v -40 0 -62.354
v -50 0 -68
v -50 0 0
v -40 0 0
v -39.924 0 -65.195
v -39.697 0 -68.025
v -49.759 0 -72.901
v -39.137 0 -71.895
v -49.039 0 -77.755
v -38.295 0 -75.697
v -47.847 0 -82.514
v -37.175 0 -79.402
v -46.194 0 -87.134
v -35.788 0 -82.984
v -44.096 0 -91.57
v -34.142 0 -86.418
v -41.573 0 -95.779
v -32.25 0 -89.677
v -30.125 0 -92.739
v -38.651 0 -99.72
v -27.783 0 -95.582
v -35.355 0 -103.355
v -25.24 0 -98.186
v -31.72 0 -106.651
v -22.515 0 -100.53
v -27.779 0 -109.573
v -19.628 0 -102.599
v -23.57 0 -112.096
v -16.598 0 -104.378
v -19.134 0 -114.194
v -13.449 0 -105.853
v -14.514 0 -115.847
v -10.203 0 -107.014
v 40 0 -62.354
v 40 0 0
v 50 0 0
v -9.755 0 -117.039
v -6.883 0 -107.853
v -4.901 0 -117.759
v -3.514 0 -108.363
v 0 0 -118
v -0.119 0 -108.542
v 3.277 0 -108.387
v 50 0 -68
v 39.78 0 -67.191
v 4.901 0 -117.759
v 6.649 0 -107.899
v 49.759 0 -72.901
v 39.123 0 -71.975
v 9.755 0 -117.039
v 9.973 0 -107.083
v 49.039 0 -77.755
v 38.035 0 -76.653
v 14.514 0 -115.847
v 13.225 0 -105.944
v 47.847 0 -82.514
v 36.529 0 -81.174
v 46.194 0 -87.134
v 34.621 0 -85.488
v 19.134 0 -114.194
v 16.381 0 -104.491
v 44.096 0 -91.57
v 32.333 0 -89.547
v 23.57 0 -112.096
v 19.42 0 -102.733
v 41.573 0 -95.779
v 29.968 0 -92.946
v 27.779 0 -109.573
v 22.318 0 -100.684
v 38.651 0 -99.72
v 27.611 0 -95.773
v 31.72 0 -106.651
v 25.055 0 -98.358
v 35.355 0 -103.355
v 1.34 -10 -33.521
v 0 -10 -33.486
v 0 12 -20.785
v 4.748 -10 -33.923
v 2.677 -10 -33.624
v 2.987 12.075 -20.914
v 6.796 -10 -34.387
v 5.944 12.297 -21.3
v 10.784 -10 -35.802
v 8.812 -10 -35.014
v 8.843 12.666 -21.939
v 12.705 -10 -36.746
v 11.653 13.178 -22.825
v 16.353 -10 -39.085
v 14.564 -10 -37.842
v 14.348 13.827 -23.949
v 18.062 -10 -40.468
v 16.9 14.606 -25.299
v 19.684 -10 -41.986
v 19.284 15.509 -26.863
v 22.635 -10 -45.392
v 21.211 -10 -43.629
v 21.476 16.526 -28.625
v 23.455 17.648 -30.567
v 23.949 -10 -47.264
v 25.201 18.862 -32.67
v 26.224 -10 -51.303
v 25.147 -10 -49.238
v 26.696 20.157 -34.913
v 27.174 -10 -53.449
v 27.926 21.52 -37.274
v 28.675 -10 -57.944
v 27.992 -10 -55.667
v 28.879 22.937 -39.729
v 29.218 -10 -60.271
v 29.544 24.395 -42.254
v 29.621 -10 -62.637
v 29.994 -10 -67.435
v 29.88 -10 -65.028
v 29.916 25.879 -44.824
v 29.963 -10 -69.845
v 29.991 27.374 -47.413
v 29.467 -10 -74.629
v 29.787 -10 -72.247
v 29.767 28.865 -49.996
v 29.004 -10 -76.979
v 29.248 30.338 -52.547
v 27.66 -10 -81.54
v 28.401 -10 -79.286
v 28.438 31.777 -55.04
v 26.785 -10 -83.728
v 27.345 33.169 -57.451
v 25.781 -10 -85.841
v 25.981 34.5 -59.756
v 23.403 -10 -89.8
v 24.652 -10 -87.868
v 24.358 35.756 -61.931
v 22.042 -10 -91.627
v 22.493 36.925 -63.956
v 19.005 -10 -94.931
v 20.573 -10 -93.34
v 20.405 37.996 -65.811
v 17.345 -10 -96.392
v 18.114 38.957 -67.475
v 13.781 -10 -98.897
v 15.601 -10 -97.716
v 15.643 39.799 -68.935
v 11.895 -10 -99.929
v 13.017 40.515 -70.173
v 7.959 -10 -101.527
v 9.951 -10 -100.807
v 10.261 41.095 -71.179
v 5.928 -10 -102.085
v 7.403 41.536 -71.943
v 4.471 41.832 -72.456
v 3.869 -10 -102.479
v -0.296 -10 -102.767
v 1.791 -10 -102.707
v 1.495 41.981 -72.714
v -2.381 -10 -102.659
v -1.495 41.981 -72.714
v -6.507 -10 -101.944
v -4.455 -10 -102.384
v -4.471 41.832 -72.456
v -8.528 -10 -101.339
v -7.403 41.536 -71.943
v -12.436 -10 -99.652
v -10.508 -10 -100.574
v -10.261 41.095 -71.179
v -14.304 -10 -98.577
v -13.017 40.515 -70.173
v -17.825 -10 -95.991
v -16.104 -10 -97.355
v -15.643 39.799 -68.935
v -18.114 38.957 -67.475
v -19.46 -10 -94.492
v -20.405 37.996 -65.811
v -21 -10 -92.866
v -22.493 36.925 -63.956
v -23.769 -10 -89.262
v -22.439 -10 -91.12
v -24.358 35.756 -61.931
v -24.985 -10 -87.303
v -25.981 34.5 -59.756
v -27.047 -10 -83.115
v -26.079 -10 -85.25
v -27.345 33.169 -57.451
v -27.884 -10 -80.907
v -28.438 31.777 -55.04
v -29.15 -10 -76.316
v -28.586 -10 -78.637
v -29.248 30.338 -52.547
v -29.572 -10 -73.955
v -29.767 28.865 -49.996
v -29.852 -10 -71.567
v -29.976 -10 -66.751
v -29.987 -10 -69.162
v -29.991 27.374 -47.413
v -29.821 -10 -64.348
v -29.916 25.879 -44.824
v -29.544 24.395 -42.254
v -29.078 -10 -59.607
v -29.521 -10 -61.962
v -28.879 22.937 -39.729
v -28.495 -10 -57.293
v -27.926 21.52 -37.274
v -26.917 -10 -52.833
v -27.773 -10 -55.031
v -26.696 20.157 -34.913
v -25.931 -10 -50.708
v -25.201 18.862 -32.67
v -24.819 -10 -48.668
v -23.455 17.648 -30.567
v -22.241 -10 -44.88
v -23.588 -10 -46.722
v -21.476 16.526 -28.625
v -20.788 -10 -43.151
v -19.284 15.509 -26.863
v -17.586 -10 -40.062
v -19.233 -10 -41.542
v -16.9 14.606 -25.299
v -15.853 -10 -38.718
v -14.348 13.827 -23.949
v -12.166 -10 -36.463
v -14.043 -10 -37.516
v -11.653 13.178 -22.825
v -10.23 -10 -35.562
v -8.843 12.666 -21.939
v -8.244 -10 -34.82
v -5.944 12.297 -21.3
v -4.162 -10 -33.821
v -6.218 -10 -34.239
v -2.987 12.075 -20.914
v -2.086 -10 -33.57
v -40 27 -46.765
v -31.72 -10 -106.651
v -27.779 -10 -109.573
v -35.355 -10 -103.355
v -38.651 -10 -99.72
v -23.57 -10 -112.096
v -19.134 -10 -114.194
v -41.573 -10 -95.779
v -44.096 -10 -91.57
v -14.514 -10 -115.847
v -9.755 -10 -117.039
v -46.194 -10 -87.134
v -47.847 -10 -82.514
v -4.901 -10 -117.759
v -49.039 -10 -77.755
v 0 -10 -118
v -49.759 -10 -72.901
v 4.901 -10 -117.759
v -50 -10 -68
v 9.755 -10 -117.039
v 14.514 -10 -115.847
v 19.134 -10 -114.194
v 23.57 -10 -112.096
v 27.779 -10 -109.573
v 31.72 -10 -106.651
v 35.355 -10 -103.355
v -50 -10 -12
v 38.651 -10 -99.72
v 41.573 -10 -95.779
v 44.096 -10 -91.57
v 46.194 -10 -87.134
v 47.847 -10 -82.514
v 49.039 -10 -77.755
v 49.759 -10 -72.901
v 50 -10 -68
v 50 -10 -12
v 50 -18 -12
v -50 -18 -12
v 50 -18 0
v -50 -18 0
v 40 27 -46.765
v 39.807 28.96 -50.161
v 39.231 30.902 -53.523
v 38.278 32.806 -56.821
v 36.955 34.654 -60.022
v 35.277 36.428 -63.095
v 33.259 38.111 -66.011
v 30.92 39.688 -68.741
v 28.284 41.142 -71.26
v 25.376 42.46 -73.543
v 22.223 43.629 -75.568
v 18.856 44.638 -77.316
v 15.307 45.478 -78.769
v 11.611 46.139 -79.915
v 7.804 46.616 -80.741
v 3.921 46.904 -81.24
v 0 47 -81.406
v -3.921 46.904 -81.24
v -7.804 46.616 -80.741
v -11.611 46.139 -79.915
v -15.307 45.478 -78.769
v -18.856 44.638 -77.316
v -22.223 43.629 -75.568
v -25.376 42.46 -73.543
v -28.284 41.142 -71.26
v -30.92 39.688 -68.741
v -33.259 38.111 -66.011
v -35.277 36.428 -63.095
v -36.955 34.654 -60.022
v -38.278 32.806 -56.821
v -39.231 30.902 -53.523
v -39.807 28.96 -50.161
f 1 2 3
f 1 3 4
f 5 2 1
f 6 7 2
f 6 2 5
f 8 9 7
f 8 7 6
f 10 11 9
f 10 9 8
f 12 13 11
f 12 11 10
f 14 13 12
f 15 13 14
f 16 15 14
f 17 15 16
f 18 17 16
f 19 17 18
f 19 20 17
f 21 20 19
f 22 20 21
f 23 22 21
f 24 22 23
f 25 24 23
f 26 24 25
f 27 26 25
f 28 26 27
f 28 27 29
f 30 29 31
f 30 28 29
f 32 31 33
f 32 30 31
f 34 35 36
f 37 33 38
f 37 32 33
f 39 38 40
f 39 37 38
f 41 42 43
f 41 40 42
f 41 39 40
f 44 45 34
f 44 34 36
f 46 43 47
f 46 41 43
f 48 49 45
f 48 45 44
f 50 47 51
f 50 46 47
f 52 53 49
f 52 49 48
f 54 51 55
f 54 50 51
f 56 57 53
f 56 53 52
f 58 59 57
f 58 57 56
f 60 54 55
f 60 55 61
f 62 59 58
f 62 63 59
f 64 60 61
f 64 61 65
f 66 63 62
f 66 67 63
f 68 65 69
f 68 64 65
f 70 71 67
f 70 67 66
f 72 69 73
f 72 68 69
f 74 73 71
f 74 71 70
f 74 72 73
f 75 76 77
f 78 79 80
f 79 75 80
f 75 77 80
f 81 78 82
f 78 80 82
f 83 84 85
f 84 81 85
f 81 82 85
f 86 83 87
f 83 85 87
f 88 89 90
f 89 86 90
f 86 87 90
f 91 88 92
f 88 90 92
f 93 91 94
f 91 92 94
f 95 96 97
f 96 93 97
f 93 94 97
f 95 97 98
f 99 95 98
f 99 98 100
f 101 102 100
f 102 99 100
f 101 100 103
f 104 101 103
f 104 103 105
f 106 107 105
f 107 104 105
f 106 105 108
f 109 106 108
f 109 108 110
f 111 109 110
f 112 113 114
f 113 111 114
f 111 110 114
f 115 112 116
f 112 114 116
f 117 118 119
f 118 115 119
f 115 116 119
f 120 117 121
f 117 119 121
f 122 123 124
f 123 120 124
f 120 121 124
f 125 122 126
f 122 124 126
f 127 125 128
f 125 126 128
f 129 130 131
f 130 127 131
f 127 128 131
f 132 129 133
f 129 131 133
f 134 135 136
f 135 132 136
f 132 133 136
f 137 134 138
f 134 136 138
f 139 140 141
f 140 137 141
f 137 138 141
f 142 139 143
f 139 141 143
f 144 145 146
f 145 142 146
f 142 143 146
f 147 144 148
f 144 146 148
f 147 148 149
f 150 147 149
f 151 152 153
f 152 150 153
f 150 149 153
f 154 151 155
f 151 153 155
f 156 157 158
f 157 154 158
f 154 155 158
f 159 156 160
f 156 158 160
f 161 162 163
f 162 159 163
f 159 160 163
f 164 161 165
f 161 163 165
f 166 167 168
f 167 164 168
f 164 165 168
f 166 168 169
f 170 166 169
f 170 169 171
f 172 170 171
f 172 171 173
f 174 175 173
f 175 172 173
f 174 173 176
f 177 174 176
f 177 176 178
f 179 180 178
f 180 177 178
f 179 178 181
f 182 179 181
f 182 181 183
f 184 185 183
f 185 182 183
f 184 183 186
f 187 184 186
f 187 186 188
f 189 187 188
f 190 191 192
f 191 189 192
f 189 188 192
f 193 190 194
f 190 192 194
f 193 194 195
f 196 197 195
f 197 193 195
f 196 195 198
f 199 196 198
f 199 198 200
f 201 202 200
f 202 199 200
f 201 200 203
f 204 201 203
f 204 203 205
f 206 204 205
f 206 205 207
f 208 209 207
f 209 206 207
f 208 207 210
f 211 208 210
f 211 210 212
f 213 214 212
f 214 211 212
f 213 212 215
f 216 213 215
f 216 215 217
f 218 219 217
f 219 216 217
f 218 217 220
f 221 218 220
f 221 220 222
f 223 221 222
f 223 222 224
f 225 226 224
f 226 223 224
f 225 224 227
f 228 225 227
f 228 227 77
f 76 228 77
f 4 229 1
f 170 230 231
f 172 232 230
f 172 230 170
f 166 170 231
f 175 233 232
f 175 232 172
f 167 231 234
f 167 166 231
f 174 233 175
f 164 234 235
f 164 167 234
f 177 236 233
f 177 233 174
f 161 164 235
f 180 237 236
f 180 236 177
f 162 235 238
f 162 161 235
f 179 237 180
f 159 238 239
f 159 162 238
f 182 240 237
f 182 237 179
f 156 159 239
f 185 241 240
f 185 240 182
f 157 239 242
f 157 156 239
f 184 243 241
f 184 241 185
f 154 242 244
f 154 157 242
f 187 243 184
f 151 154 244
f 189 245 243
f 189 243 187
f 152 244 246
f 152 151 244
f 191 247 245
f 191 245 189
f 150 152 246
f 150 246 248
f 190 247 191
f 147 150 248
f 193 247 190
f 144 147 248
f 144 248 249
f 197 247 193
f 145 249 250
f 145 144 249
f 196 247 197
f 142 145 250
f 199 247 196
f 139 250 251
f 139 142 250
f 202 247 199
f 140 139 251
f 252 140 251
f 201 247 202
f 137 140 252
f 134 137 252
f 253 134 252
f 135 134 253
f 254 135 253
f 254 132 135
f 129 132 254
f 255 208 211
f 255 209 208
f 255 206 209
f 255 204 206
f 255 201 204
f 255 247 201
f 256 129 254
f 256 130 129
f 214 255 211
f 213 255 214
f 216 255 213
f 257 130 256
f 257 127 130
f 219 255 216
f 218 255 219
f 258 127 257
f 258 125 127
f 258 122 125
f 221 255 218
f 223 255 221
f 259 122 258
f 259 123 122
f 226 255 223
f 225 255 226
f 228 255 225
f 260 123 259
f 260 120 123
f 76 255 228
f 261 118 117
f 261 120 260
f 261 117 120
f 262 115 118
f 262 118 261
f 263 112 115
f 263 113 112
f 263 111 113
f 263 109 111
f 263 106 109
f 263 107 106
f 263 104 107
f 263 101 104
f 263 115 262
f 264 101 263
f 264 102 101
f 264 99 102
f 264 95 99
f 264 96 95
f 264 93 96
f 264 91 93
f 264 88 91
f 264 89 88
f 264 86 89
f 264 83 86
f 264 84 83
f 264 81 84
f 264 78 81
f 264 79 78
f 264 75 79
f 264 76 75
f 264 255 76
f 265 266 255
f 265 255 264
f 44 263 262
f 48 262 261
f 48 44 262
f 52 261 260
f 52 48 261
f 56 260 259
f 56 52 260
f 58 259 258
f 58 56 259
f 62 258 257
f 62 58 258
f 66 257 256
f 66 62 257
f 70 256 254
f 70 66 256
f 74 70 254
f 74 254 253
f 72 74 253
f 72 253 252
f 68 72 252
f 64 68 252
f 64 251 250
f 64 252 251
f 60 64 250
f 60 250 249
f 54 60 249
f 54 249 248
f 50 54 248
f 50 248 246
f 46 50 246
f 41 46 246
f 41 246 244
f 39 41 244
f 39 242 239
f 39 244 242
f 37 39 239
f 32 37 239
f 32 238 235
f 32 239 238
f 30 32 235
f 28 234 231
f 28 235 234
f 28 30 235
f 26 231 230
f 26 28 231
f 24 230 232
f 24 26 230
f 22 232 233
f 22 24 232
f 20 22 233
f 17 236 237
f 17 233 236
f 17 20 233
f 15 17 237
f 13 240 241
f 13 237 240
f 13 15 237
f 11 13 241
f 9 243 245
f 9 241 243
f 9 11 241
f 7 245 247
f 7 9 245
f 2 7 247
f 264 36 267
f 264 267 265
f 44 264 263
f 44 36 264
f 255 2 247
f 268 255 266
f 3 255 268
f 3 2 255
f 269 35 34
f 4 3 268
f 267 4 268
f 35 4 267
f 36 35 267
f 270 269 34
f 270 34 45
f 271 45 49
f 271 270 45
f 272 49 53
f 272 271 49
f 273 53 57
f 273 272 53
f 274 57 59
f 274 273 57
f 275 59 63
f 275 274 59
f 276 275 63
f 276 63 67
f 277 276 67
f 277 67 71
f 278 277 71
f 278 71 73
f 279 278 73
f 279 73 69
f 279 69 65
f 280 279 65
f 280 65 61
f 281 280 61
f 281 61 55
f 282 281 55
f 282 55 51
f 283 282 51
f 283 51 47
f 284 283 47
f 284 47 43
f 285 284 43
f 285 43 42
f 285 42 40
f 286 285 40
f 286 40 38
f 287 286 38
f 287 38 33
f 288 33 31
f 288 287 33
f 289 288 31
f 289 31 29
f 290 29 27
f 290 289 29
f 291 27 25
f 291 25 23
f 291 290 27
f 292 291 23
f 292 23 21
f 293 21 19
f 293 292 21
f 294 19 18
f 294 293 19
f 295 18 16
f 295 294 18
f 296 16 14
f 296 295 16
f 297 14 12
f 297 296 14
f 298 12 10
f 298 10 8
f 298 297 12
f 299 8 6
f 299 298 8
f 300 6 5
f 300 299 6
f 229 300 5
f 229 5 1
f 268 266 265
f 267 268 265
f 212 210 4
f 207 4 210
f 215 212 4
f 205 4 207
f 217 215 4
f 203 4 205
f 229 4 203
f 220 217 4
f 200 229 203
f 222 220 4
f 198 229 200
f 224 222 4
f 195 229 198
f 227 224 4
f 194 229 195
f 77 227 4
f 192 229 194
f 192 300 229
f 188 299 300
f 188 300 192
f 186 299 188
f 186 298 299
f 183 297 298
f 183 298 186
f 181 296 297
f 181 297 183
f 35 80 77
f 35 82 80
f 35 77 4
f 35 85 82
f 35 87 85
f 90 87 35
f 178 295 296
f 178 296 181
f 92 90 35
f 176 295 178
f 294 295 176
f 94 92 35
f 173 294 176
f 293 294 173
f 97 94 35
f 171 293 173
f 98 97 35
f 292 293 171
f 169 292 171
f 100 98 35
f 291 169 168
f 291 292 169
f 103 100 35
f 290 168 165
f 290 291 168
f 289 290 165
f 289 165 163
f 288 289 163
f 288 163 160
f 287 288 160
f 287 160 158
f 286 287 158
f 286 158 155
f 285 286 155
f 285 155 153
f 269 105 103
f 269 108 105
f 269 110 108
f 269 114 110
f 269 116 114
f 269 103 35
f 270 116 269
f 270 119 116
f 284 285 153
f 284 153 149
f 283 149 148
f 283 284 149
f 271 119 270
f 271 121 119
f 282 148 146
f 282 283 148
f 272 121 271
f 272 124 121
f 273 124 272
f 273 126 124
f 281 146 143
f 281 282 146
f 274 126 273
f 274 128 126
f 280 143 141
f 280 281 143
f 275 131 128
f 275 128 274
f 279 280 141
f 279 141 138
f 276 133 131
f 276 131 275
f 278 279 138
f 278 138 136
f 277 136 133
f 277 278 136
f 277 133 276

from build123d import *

# Parameters (mm, degrees)
EXTRUDE_3_DEPTH     = 18
SKETCH_8_W          = 100
SKETCH_8_H          = 106
CUT_EXTRUDE_1_DEPTH = 8
EXTRUDE_5_REACH     = 98.125
CUT_EXTRUDE_2_REACH = 98.125
SKETCH_18_R         = 30


with BuildPart() as part:
    # 草圖7 → 填料-伸長3 (new body)
    with BuildSketch(Plane(origin=(0, 0, 0), x_dir=(1, 0, 0), z_dir=(0, 1, 0))):
        with BuildLine():
            Line((-50, 0), (50, 0))
            Line((50, 0), (50, 68))
            ThreePointArc((50, 68), (0, 118), (-50, 68))
            Line((-50, 68), (-50, 0))
        make_face()
    extrude(amount=-EXTRUDE_3_DEPTH)

    # 草圖8 → 除料-伸長1 (cut)
    with BuildSketch(Plane.XZ.offset(18)):
        with Locations((0, -65)):
            Rectangle(SKETCH_8_W, SKETCH_8_H)
    extrude(amount=-CUT_EXTRUDE_1_DEPTH, mode=Mode.SUBTRACT)

    # 填料-伸長5: up to this face of the body (flat: up to its plane)
    extrude_5_end = Plane(part.part.faces().sort_by_distance((0, -10, -60.288575892))[0])
    # 草圖16 → 填料-伸長5 (add, up to the picked face)
    with BuildSketch(Plane(origin=(0, 29.444863729, -51), x_dir=(1, 0, 0), z_dir=(0, 0.866025403784436, 0.5000000000000044)), mode=Mode.PRIVATE) as extrude_5_sk1:
        with BuildLine():
            Line((-40, -58.889727457), (40, -58.889727457))
            Line((40, -58.889727457), (40, -4.889727457))
            ThreePointArc((40, -4.889727457), (0, 35.110272543), (-40, -4.889727457))
            Line((-40, -4.889727457), (-40, -58.889727457))
        make_face()
    extrude_5_tool1 = split(extrude(extrude_5_sk1.sketch, amount=-EXTRUDE_5_REACH, mode=Mode.PRIVATE), bisect_by=extrude_5_end, keep=Keep.BOTH, mode=Mode.PRIVATE)
    add(extrude_5_tool1.solids().sort_by(Axis((0, 21.58727, -37.390249), (0, -0.866025403784436, -0.5000000000000044)))[0])

    # 除料-伸長2: up to this plane
    cut_extrude_2_end = Plane(origin=(0, -10, 0), z_dir=(0, -1, 0))
    # 草圖18 → 除料-伸長2 (cut, up to the surface)
    with BuildSketch(Plane(origin=(0, 29.444863729, -51), x_dir=(1, 0, 0), z_dir=(0, 0.866025403784436, 0.5000000000000044)), mode=Mode.PRIVATE) as cut_extrude_2_sk1:
        with Locations(Location((0, -4.889727457, 0), (0, 0, 270))):
            Circle(SKETCH_18_R)
    cut_extrude_2_tool1 = split(extrude(cut_extrude_2_sk1.sketch, amount=-CUT_EXTRUDE_2_REACH, mode=Mode.PRIVATE), bisect_by=cut_extrude_2_end, keep=Keep.BOTH, mode=Mode.PRIVATE)
    add(cut_extrude_2_tool1.solids().sort_by_distance((0, 27, -46.765372))[0], mode=Mode.SUBTRACT)


solid = part.part
